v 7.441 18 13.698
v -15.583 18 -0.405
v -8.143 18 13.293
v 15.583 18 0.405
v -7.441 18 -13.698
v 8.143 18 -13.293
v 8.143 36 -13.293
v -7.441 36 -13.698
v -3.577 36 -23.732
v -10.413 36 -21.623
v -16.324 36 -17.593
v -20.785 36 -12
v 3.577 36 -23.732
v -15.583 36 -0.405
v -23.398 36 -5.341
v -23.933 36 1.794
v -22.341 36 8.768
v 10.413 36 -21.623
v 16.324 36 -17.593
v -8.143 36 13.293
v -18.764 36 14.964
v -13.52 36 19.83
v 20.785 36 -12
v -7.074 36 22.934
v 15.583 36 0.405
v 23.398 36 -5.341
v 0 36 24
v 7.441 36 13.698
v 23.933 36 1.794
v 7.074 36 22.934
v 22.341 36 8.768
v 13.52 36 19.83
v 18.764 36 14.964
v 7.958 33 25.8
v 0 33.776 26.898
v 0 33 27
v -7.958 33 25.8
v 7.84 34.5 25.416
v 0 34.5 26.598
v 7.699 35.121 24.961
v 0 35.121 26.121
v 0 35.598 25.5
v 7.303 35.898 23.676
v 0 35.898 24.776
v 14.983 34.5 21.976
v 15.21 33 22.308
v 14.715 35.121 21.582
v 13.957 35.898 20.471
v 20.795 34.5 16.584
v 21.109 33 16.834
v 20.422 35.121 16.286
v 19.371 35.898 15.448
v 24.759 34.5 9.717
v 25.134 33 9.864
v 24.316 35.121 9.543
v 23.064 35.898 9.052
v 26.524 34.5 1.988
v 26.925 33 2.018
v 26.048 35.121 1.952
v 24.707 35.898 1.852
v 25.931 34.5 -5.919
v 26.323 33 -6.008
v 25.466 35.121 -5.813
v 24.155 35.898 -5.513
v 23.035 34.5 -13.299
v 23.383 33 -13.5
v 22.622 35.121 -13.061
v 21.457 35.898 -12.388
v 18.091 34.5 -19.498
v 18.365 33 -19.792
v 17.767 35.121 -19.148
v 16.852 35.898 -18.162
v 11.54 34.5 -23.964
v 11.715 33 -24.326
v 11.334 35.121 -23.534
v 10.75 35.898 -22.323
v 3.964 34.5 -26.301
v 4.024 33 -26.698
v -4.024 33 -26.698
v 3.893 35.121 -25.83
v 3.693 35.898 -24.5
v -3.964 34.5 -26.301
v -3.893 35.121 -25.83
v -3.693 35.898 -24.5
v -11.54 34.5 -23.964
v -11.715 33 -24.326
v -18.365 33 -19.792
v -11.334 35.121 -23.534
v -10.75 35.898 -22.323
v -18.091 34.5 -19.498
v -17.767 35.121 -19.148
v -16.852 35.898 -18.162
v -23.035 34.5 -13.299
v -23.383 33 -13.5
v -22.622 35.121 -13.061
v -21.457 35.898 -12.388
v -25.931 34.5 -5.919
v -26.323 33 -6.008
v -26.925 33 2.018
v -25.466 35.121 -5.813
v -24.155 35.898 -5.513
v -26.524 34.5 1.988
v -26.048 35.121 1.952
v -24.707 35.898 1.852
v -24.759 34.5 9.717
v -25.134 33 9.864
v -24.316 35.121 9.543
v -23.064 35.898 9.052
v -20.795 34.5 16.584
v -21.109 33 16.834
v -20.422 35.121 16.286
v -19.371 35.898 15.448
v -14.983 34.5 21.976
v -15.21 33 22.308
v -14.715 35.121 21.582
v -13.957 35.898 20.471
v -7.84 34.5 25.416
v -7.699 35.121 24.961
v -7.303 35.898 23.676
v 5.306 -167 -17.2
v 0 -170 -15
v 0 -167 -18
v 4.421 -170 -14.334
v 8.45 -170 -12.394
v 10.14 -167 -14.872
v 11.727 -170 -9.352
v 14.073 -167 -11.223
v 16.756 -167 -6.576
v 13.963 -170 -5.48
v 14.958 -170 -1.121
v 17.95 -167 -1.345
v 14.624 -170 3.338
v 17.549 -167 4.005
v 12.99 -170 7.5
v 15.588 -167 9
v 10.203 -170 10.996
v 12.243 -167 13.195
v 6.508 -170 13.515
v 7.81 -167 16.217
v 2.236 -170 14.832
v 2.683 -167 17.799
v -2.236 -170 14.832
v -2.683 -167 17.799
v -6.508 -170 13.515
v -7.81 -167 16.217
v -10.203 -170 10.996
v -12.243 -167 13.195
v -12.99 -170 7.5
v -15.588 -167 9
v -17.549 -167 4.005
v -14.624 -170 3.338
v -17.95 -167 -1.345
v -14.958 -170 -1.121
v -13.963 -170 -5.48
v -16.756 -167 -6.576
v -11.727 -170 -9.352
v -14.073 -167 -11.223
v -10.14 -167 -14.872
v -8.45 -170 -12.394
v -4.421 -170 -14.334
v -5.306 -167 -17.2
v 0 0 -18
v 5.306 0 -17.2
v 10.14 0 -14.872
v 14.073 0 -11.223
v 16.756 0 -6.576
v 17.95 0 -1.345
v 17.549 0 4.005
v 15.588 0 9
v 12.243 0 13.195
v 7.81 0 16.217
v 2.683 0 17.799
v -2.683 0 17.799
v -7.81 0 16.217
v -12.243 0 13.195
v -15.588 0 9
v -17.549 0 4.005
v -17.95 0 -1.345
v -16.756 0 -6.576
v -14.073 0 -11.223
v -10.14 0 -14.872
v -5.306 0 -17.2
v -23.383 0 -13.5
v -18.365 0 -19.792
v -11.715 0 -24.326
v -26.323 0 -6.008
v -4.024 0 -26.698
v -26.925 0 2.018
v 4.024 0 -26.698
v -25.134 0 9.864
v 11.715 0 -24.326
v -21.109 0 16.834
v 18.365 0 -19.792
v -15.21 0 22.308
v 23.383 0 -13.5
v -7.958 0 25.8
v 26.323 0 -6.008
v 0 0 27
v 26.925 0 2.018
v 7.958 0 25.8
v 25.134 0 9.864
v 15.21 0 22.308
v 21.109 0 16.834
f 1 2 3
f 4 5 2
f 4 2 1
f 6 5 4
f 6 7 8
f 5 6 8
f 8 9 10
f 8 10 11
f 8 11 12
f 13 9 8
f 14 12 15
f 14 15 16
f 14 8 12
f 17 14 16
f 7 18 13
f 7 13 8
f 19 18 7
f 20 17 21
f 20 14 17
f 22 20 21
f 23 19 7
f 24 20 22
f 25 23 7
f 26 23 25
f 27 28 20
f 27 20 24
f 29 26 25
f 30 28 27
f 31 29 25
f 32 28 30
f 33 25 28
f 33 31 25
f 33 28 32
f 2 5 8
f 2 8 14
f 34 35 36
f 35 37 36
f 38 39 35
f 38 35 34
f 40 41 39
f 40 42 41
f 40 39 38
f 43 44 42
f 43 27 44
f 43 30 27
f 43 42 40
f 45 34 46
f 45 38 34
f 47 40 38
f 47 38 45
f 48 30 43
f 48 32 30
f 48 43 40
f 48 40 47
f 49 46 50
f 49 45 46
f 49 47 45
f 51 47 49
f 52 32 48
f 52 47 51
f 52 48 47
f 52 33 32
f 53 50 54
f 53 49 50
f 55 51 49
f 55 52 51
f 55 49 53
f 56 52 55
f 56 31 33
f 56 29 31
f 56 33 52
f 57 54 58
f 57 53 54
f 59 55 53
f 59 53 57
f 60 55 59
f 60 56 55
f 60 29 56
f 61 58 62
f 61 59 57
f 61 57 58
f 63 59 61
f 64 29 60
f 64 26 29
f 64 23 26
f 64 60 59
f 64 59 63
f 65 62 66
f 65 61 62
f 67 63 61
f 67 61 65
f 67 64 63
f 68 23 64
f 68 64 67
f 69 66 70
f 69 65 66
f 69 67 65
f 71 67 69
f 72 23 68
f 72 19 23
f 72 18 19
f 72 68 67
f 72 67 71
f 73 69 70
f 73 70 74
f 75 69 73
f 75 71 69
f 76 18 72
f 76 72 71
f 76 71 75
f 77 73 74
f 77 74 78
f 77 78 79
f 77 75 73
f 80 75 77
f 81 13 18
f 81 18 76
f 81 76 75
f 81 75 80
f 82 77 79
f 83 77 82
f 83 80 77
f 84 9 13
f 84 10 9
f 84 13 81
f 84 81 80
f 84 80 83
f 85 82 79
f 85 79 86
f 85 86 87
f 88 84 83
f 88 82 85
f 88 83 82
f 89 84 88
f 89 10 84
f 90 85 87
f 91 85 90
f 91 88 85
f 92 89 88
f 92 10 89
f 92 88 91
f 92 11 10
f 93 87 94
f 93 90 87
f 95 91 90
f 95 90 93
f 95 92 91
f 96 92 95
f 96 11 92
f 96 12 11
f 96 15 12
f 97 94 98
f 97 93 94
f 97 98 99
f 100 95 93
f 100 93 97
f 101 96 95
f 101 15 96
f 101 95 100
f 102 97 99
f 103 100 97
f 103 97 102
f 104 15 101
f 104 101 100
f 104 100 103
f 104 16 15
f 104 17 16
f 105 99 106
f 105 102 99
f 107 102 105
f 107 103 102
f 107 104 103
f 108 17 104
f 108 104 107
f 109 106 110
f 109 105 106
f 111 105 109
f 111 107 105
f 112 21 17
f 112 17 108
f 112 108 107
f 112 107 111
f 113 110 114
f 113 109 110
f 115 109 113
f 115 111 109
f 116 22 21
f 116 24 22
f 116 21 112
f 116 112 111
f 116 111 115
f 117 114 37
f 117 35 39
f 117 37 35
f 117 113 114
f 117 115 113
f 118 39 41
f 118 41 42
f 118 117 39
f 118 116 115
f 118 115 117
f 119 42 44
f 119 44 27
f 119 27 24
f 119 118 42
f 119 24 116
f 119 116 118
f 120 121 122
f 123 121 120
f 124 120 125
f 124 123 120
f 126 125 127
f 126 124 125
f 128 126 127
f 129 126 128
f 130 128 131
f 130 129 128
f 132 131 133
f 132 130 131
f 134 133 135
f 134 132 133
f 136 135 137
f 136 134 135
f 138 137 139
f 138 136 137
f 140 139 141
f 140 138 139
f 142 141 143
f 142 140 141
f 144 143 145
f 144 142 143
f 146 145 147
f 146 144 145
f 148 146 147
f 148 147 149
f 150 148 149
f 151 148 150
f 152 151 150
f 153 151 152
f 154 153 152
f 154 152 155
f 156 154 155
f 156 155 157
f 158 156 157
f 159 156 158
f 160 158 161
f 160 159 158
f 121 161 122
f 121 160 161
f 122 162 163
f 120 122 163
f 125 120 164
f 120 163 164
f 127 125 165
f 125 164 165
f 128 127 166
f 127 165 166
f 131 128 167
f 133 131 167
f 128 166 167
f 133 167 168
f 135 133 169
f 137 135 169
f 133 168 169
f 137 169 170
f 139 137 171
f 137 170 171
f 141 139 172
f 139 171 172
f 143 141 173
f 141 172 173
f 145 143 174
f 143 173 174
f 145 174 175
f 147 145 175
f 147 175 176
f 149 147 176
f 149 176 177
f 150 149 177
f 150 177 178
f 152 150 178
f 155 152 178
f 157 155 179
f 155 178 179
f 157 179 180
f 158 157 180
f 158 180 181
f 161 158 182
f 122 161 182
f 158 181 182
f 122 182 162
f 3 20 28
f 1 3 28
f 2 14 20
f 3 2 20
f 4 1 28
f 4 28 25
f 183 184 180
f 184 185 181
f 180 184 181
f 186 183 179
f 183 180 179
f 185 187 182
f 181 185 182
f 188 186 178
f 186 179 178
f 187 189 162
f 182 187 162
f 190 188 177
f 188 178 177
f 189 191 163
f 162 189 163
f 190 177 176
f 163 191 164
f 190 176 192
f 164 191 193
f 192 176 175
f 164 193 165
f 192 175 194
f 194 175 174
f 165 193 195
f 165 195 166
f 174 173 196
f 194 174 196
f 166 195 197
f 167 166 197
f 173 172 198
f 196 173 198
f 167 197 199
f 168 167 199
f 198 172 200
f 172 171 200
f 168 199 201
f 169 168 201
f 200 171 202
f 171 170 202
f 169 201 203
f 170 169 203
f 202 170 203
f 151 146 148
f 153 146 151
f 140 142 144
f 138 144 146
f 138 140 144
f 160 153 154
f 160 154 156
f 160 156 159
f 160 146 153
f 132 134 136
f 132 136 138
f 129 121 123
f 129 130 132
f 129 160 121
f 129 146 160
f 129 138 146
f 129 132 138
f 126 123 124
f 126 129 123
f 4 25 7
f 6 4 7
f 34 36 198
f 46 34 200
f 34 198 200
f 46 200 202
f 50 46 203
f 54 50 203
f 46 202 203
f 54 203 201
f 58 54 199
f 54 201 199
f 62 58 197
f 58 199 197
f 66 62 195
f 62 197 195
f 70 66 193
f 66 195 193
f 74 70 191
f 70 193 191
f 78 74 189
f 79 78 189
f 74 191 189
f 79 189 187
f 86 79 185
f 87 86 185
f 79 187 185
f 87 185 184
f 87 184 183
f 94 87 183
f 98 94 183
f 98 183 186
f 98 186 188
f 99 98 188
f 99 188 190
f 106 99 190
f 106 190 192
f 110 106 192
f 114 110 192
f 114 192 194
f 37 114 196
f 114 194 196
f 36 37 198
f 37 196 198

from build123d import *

# Parameters (mm, degrees)
DIAMETRE_TETE_R     = 27
HAUTEUR_TETE_DEPTH  = 36
CONGE_R             = 3
DIAMETRE_R          = 18
LONGUEUR_DEPTH      = 170
HAUTEUR_6PANS_DEPTH = 18
CHANFREIN_SIZE      = 3


with BuildPart() as part:
    # DIAMETRE_TETE → HAUTEUR_TETE (new body)
    with BuildSketch(Plane(origin=(0, 0, 0), x_dir=(1, 0, 0), z_dir=(0, 1, 0))):
        with Locations(Location((0, 0, 0), (0, 0, 270))):
            Circle(DIAMETRE_TETE_R)
    extrude(amount=HAUTEUR_TETE_DEPTH)

    # CONGE
    conge_edges = [part.edges().sort_by_distance(p)[0] for p in [
        (0, 36, -27),
    ]]
    fillet(conge_edges, radius=CONGE_R)

    # DIAMETRE → LONGUEUR (add)
    with BuildSketch(Plane.XZ):
        with Locations(Location((0, 0, 0), (0, 0, 270))):
            Circle(DIAMETRE_R)
    extrude(amount=LONGUEUR_DEPTH)

    # LARGEUR_6PANS → HAUTEUR_6PANS (cut)
    with BuildSketch(Plane(origin=(0, 36, 0), x_dir=(1, 0, 0), z_dir=(0, 1, 0))):
        Polygon((8.142672131, 13.292738265), (-7.440512958, 13.698130052), (-15.583185088, 0.405391788), (-8.142672131, -13.292738265), (7.440512958, -13.698130052), (15.583185088, -0.405391788), align=None)
    extrude(amount=-HAUTEUR_6PANS_DEPTH, mode=Mode.SUBTRACT)

    # CHANFREIN
    chanfrein_edges = [part.edges().sort_by_distance(p)[0] for p in [
        (0, -170, 18),
    ]]
    chamfer(chanfrein_edges, length=CHANFREIN_SIZE)


solid = part.part
